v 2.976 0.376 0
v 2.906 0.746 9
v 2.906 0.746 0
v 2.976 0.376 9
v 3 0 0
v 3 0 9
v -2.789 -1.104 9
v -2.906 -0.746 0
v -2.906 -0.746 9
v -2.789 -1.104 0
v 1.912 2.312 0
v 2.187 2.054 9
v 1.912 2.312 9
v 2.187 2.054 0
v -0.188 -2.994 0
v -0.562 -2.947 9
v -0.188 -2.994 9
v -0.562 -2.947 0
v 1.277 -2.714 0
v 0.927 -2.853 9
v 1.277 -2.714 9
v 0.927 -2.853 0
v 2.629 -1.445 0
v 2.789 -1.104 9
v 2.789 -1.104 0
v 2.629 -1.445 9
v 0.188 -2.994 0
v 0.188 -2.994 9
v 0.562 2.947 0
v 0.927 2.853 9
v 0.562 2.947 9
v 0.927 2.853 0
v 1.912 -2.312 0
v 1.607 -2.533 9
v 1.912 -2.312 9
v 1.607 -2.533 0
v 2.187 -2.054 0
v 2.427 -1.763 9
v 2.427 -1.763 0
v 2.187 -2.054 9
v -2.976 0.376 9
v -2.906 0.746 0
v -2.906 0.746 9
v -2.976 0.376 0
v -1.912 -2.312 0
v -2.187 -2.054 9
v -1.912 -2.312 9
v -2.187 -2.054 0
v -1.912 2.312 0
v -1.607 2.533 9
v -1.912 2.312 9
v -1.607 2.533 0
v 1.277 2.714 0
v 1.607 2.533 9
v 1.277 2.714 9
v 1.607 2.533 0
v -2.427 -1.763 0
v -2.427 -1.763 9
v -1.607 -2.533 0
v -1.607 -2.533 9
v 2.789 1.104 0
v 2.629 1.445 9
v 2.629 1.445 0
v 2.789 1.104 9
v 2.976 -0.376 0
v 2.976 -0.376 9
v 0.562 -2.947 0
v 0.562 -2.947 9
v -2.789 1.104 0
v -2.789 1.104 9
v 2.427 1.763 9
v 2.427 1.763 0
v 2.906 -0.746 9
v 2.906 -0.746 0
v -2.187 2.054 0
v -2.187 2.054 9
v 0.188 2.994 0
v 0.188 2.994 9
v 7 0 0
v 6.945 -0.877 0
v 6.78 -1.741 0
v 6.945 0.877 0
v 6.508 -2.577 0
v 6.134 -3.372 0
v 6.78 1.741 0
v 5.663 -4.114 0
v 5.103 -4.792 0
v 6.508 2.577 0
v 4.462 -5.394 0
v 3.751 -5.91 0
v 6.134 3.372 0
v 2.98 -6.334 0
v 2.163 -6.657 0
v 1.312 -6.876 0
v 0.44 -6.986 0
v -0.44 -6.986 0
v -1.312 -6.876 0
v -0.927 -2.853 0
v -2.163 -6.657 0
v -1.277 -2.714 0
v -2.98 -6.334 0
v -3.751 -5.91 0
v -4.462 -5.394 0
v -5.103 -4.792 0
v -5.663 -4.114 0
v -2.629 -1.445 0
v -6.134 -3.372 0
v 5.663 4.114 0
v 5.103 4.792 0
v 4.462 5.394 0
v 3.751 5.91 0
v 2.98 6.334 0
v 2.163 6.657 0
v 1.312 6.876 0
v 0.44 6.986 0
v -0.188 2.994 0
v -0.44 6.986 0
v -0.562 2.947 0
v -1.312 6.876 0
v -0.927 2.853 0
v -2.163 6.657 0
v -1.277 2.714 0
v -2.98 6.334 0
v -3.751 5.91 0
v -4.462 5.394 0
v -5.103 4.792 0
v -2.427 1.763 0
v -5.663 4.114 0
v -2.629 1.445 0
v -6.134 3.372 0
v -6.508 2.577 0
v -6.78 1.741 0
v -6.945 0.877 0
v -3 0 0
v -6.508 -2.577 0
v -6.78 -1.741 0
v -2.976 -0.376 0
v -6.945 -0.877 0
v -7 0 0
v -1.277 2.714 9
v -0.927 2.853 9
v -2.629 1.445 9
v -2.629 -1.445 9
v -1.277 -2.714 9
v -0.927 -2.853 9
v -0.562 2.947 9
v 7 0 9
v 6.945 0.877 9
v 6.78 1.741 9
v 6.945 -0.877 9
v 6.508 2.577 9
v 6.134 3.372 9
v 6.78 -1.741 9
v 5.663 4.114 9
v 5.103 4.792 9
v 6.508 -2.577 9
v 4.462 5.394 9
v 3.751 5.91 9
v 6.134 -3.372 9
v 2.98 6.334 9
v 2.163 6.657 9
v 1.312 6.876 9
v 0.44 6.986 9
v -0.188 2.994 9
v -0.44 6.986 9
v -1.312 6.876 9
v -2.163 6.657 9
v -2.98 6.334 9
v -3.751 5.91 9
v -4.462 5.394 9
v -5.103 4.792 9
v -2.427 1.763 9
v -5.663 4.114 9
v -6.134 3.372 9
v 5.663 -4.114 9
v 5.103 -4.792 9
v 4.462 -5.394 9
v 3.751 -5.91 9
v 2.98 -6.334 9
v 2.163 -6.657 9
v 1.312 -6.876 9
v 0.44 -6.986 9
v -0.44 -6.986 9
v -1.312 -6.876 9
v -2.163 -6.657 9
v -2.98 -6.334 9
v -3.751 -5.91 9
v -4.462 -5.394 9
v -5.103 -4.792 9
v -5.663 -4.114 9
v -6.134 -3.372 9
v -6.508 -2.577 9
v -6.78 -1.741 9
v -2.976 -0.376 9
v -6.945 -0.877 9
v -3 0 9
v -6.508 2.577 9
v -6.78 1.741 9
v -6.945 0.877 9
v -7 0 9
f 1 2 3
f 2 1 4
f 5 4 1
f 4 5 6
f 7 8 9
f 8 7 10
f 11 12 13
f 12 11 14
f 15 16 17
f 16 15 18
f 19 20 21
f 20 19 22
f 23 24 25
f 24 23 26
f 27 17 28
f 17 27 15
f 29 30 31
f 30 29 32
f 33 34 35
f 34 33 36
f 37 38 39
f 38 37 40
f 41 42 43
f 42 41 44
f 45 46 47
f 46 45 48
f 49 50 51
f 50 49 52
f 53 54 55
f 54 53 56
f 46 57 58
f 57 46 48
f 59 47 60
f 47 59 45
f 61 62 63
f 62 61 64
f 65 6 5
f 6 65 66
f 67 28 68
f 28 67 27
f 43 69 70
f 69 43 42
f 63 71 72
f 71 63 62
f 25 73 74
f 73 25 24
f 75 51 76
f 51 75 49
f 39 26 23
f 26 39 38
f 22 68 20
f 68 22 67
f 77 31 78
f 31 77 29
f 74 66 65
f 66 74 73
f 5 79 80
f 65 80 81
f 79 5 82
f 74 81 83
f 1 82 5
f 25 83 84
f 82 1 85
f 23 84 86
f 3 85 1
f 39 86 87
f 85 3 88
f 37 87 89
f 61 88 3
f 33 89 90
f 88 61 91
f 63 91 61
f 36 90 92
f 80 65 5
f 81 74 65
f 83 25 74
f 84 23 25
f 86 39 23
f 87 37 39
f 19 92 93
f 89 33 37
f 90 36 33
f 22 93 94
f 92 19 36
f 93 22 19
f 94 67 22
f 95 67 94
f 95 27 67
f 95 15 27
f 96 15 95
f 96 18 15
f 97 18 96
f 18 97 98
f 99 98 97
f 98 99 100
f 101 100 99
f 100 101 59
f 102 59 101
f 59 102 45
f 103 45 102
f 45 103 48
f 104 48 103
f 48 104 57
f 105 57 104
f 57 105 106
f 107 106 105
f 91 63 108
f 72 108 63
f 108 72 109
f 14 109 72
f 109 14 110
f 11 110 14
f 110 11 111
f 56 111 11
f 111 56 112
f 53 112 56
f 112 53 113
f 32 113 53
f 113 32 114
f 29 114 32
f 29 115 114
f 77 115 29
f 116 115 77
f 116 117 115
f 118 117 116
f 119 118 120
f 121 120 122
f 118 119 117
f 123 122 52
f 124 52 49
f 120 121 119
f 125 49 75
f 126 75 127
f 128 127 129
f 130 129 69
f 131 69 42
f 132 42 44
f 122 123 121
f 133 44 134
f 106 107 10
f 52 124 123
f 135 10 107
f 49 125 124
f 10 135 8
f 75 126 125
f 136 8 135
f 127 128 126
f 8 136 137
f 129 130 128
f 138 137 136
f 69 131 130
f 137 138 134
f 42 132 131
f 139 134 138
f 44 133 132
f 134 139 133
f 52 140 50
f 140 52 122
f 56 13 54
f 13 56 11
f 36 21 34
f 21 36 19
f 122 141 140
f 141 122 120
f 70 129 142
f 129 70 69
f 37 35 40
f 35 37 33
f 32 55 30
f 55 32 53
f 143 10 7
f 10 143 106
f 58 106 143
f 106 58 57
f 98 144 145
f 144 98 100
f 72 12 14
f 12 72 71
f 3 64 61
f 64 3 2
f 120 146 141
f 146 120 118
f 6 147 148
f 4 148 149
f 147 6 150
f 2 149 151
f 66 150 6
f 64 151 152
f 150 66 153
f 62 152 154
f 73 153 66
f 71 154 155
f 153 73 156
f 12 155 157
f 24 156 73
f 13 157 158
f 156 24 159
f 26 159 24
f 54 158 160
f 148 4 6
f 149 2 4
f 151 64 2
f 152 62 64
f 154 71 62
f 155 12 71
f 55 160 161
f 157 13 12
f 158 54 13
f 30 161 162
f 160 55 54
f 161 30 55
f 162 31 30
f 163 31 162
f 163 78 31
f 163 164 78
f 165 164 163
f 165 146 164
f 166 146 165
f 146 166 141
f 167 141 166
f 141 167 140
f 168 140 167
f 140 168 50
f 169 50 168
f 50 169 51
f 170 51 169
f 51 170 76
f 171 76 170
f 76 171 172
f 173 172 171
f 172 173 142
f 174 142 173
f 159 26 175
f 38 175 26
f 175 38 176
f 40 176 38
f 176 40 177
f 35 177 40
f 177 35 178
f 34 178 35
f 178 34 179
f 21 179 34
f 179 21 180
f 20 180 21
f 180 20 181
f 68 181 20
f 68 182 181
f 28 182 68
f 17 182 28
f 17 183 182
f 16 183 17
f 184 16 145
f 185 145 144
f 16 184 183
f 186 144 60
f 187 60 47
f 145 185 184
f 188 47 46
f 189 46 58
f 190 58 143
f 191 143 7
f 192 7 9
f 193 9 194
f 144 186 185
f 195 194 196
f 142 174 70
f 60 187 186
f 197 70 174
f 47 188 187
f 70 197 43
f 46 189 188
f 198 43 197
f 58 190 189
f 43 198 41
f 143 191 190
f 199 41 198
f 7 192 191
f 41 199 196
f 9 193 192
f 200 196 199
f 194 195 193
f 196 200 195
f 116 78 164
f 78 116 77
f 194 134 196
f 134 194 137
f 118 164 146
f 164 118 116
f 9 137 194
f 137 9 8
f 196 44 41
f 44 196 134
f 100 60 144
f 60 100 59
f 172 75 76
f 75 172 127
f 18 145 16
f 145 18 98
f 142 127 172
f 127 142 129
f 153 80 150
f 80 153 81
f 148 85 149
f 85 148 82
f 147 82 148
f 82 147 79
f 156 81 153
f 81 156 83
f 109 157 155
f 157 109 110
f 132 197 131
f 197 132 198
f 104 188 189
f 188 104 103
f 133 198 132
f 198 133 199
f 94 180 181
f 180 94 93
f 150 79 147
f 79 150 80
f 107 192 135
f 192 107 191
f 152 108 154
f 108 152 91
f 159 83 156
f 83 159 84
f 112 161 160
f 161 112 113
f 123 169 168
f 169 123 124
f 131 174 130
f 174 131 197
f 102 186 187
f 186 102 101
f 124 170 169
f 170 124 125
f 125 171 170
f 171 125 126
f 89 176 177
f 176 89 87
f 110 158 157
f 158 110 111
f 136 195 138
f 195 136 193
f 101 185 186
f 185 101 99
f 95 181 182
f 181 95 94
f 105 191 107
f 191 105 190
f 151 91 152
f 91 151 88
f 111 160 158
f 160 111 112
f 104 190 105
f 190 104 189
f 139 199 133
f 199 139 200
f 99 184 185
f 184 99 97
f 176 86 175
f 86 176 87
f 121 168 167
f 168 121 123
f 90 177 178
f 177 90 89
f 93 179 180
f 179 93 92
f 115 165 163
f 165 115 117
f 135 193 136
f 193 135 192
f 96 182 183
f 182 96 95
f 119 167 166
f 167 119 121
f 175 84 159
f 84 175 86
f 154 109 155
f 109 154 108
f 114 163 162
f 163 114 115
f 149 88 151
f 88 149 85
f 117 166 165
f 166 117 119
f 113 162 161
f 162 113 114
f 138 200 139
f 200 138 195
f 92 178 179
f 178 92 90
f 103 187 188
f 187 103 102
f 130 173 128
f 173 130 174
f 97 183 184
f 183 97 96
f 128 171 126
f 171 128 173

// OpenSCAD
$fn = 50;


difference() {
	union() {
		cylinder(h = 9, r = 7.0000000000);
	}
	union() {
		cylinder(h = 9, r = 3.0000000000);
		cylinder(h = 9, r = 1.5000000000);
		cylinder(h = 9, r = 1.5000000000);
		cylinder(h = 9, r = 1.5000000000);
	}
}
